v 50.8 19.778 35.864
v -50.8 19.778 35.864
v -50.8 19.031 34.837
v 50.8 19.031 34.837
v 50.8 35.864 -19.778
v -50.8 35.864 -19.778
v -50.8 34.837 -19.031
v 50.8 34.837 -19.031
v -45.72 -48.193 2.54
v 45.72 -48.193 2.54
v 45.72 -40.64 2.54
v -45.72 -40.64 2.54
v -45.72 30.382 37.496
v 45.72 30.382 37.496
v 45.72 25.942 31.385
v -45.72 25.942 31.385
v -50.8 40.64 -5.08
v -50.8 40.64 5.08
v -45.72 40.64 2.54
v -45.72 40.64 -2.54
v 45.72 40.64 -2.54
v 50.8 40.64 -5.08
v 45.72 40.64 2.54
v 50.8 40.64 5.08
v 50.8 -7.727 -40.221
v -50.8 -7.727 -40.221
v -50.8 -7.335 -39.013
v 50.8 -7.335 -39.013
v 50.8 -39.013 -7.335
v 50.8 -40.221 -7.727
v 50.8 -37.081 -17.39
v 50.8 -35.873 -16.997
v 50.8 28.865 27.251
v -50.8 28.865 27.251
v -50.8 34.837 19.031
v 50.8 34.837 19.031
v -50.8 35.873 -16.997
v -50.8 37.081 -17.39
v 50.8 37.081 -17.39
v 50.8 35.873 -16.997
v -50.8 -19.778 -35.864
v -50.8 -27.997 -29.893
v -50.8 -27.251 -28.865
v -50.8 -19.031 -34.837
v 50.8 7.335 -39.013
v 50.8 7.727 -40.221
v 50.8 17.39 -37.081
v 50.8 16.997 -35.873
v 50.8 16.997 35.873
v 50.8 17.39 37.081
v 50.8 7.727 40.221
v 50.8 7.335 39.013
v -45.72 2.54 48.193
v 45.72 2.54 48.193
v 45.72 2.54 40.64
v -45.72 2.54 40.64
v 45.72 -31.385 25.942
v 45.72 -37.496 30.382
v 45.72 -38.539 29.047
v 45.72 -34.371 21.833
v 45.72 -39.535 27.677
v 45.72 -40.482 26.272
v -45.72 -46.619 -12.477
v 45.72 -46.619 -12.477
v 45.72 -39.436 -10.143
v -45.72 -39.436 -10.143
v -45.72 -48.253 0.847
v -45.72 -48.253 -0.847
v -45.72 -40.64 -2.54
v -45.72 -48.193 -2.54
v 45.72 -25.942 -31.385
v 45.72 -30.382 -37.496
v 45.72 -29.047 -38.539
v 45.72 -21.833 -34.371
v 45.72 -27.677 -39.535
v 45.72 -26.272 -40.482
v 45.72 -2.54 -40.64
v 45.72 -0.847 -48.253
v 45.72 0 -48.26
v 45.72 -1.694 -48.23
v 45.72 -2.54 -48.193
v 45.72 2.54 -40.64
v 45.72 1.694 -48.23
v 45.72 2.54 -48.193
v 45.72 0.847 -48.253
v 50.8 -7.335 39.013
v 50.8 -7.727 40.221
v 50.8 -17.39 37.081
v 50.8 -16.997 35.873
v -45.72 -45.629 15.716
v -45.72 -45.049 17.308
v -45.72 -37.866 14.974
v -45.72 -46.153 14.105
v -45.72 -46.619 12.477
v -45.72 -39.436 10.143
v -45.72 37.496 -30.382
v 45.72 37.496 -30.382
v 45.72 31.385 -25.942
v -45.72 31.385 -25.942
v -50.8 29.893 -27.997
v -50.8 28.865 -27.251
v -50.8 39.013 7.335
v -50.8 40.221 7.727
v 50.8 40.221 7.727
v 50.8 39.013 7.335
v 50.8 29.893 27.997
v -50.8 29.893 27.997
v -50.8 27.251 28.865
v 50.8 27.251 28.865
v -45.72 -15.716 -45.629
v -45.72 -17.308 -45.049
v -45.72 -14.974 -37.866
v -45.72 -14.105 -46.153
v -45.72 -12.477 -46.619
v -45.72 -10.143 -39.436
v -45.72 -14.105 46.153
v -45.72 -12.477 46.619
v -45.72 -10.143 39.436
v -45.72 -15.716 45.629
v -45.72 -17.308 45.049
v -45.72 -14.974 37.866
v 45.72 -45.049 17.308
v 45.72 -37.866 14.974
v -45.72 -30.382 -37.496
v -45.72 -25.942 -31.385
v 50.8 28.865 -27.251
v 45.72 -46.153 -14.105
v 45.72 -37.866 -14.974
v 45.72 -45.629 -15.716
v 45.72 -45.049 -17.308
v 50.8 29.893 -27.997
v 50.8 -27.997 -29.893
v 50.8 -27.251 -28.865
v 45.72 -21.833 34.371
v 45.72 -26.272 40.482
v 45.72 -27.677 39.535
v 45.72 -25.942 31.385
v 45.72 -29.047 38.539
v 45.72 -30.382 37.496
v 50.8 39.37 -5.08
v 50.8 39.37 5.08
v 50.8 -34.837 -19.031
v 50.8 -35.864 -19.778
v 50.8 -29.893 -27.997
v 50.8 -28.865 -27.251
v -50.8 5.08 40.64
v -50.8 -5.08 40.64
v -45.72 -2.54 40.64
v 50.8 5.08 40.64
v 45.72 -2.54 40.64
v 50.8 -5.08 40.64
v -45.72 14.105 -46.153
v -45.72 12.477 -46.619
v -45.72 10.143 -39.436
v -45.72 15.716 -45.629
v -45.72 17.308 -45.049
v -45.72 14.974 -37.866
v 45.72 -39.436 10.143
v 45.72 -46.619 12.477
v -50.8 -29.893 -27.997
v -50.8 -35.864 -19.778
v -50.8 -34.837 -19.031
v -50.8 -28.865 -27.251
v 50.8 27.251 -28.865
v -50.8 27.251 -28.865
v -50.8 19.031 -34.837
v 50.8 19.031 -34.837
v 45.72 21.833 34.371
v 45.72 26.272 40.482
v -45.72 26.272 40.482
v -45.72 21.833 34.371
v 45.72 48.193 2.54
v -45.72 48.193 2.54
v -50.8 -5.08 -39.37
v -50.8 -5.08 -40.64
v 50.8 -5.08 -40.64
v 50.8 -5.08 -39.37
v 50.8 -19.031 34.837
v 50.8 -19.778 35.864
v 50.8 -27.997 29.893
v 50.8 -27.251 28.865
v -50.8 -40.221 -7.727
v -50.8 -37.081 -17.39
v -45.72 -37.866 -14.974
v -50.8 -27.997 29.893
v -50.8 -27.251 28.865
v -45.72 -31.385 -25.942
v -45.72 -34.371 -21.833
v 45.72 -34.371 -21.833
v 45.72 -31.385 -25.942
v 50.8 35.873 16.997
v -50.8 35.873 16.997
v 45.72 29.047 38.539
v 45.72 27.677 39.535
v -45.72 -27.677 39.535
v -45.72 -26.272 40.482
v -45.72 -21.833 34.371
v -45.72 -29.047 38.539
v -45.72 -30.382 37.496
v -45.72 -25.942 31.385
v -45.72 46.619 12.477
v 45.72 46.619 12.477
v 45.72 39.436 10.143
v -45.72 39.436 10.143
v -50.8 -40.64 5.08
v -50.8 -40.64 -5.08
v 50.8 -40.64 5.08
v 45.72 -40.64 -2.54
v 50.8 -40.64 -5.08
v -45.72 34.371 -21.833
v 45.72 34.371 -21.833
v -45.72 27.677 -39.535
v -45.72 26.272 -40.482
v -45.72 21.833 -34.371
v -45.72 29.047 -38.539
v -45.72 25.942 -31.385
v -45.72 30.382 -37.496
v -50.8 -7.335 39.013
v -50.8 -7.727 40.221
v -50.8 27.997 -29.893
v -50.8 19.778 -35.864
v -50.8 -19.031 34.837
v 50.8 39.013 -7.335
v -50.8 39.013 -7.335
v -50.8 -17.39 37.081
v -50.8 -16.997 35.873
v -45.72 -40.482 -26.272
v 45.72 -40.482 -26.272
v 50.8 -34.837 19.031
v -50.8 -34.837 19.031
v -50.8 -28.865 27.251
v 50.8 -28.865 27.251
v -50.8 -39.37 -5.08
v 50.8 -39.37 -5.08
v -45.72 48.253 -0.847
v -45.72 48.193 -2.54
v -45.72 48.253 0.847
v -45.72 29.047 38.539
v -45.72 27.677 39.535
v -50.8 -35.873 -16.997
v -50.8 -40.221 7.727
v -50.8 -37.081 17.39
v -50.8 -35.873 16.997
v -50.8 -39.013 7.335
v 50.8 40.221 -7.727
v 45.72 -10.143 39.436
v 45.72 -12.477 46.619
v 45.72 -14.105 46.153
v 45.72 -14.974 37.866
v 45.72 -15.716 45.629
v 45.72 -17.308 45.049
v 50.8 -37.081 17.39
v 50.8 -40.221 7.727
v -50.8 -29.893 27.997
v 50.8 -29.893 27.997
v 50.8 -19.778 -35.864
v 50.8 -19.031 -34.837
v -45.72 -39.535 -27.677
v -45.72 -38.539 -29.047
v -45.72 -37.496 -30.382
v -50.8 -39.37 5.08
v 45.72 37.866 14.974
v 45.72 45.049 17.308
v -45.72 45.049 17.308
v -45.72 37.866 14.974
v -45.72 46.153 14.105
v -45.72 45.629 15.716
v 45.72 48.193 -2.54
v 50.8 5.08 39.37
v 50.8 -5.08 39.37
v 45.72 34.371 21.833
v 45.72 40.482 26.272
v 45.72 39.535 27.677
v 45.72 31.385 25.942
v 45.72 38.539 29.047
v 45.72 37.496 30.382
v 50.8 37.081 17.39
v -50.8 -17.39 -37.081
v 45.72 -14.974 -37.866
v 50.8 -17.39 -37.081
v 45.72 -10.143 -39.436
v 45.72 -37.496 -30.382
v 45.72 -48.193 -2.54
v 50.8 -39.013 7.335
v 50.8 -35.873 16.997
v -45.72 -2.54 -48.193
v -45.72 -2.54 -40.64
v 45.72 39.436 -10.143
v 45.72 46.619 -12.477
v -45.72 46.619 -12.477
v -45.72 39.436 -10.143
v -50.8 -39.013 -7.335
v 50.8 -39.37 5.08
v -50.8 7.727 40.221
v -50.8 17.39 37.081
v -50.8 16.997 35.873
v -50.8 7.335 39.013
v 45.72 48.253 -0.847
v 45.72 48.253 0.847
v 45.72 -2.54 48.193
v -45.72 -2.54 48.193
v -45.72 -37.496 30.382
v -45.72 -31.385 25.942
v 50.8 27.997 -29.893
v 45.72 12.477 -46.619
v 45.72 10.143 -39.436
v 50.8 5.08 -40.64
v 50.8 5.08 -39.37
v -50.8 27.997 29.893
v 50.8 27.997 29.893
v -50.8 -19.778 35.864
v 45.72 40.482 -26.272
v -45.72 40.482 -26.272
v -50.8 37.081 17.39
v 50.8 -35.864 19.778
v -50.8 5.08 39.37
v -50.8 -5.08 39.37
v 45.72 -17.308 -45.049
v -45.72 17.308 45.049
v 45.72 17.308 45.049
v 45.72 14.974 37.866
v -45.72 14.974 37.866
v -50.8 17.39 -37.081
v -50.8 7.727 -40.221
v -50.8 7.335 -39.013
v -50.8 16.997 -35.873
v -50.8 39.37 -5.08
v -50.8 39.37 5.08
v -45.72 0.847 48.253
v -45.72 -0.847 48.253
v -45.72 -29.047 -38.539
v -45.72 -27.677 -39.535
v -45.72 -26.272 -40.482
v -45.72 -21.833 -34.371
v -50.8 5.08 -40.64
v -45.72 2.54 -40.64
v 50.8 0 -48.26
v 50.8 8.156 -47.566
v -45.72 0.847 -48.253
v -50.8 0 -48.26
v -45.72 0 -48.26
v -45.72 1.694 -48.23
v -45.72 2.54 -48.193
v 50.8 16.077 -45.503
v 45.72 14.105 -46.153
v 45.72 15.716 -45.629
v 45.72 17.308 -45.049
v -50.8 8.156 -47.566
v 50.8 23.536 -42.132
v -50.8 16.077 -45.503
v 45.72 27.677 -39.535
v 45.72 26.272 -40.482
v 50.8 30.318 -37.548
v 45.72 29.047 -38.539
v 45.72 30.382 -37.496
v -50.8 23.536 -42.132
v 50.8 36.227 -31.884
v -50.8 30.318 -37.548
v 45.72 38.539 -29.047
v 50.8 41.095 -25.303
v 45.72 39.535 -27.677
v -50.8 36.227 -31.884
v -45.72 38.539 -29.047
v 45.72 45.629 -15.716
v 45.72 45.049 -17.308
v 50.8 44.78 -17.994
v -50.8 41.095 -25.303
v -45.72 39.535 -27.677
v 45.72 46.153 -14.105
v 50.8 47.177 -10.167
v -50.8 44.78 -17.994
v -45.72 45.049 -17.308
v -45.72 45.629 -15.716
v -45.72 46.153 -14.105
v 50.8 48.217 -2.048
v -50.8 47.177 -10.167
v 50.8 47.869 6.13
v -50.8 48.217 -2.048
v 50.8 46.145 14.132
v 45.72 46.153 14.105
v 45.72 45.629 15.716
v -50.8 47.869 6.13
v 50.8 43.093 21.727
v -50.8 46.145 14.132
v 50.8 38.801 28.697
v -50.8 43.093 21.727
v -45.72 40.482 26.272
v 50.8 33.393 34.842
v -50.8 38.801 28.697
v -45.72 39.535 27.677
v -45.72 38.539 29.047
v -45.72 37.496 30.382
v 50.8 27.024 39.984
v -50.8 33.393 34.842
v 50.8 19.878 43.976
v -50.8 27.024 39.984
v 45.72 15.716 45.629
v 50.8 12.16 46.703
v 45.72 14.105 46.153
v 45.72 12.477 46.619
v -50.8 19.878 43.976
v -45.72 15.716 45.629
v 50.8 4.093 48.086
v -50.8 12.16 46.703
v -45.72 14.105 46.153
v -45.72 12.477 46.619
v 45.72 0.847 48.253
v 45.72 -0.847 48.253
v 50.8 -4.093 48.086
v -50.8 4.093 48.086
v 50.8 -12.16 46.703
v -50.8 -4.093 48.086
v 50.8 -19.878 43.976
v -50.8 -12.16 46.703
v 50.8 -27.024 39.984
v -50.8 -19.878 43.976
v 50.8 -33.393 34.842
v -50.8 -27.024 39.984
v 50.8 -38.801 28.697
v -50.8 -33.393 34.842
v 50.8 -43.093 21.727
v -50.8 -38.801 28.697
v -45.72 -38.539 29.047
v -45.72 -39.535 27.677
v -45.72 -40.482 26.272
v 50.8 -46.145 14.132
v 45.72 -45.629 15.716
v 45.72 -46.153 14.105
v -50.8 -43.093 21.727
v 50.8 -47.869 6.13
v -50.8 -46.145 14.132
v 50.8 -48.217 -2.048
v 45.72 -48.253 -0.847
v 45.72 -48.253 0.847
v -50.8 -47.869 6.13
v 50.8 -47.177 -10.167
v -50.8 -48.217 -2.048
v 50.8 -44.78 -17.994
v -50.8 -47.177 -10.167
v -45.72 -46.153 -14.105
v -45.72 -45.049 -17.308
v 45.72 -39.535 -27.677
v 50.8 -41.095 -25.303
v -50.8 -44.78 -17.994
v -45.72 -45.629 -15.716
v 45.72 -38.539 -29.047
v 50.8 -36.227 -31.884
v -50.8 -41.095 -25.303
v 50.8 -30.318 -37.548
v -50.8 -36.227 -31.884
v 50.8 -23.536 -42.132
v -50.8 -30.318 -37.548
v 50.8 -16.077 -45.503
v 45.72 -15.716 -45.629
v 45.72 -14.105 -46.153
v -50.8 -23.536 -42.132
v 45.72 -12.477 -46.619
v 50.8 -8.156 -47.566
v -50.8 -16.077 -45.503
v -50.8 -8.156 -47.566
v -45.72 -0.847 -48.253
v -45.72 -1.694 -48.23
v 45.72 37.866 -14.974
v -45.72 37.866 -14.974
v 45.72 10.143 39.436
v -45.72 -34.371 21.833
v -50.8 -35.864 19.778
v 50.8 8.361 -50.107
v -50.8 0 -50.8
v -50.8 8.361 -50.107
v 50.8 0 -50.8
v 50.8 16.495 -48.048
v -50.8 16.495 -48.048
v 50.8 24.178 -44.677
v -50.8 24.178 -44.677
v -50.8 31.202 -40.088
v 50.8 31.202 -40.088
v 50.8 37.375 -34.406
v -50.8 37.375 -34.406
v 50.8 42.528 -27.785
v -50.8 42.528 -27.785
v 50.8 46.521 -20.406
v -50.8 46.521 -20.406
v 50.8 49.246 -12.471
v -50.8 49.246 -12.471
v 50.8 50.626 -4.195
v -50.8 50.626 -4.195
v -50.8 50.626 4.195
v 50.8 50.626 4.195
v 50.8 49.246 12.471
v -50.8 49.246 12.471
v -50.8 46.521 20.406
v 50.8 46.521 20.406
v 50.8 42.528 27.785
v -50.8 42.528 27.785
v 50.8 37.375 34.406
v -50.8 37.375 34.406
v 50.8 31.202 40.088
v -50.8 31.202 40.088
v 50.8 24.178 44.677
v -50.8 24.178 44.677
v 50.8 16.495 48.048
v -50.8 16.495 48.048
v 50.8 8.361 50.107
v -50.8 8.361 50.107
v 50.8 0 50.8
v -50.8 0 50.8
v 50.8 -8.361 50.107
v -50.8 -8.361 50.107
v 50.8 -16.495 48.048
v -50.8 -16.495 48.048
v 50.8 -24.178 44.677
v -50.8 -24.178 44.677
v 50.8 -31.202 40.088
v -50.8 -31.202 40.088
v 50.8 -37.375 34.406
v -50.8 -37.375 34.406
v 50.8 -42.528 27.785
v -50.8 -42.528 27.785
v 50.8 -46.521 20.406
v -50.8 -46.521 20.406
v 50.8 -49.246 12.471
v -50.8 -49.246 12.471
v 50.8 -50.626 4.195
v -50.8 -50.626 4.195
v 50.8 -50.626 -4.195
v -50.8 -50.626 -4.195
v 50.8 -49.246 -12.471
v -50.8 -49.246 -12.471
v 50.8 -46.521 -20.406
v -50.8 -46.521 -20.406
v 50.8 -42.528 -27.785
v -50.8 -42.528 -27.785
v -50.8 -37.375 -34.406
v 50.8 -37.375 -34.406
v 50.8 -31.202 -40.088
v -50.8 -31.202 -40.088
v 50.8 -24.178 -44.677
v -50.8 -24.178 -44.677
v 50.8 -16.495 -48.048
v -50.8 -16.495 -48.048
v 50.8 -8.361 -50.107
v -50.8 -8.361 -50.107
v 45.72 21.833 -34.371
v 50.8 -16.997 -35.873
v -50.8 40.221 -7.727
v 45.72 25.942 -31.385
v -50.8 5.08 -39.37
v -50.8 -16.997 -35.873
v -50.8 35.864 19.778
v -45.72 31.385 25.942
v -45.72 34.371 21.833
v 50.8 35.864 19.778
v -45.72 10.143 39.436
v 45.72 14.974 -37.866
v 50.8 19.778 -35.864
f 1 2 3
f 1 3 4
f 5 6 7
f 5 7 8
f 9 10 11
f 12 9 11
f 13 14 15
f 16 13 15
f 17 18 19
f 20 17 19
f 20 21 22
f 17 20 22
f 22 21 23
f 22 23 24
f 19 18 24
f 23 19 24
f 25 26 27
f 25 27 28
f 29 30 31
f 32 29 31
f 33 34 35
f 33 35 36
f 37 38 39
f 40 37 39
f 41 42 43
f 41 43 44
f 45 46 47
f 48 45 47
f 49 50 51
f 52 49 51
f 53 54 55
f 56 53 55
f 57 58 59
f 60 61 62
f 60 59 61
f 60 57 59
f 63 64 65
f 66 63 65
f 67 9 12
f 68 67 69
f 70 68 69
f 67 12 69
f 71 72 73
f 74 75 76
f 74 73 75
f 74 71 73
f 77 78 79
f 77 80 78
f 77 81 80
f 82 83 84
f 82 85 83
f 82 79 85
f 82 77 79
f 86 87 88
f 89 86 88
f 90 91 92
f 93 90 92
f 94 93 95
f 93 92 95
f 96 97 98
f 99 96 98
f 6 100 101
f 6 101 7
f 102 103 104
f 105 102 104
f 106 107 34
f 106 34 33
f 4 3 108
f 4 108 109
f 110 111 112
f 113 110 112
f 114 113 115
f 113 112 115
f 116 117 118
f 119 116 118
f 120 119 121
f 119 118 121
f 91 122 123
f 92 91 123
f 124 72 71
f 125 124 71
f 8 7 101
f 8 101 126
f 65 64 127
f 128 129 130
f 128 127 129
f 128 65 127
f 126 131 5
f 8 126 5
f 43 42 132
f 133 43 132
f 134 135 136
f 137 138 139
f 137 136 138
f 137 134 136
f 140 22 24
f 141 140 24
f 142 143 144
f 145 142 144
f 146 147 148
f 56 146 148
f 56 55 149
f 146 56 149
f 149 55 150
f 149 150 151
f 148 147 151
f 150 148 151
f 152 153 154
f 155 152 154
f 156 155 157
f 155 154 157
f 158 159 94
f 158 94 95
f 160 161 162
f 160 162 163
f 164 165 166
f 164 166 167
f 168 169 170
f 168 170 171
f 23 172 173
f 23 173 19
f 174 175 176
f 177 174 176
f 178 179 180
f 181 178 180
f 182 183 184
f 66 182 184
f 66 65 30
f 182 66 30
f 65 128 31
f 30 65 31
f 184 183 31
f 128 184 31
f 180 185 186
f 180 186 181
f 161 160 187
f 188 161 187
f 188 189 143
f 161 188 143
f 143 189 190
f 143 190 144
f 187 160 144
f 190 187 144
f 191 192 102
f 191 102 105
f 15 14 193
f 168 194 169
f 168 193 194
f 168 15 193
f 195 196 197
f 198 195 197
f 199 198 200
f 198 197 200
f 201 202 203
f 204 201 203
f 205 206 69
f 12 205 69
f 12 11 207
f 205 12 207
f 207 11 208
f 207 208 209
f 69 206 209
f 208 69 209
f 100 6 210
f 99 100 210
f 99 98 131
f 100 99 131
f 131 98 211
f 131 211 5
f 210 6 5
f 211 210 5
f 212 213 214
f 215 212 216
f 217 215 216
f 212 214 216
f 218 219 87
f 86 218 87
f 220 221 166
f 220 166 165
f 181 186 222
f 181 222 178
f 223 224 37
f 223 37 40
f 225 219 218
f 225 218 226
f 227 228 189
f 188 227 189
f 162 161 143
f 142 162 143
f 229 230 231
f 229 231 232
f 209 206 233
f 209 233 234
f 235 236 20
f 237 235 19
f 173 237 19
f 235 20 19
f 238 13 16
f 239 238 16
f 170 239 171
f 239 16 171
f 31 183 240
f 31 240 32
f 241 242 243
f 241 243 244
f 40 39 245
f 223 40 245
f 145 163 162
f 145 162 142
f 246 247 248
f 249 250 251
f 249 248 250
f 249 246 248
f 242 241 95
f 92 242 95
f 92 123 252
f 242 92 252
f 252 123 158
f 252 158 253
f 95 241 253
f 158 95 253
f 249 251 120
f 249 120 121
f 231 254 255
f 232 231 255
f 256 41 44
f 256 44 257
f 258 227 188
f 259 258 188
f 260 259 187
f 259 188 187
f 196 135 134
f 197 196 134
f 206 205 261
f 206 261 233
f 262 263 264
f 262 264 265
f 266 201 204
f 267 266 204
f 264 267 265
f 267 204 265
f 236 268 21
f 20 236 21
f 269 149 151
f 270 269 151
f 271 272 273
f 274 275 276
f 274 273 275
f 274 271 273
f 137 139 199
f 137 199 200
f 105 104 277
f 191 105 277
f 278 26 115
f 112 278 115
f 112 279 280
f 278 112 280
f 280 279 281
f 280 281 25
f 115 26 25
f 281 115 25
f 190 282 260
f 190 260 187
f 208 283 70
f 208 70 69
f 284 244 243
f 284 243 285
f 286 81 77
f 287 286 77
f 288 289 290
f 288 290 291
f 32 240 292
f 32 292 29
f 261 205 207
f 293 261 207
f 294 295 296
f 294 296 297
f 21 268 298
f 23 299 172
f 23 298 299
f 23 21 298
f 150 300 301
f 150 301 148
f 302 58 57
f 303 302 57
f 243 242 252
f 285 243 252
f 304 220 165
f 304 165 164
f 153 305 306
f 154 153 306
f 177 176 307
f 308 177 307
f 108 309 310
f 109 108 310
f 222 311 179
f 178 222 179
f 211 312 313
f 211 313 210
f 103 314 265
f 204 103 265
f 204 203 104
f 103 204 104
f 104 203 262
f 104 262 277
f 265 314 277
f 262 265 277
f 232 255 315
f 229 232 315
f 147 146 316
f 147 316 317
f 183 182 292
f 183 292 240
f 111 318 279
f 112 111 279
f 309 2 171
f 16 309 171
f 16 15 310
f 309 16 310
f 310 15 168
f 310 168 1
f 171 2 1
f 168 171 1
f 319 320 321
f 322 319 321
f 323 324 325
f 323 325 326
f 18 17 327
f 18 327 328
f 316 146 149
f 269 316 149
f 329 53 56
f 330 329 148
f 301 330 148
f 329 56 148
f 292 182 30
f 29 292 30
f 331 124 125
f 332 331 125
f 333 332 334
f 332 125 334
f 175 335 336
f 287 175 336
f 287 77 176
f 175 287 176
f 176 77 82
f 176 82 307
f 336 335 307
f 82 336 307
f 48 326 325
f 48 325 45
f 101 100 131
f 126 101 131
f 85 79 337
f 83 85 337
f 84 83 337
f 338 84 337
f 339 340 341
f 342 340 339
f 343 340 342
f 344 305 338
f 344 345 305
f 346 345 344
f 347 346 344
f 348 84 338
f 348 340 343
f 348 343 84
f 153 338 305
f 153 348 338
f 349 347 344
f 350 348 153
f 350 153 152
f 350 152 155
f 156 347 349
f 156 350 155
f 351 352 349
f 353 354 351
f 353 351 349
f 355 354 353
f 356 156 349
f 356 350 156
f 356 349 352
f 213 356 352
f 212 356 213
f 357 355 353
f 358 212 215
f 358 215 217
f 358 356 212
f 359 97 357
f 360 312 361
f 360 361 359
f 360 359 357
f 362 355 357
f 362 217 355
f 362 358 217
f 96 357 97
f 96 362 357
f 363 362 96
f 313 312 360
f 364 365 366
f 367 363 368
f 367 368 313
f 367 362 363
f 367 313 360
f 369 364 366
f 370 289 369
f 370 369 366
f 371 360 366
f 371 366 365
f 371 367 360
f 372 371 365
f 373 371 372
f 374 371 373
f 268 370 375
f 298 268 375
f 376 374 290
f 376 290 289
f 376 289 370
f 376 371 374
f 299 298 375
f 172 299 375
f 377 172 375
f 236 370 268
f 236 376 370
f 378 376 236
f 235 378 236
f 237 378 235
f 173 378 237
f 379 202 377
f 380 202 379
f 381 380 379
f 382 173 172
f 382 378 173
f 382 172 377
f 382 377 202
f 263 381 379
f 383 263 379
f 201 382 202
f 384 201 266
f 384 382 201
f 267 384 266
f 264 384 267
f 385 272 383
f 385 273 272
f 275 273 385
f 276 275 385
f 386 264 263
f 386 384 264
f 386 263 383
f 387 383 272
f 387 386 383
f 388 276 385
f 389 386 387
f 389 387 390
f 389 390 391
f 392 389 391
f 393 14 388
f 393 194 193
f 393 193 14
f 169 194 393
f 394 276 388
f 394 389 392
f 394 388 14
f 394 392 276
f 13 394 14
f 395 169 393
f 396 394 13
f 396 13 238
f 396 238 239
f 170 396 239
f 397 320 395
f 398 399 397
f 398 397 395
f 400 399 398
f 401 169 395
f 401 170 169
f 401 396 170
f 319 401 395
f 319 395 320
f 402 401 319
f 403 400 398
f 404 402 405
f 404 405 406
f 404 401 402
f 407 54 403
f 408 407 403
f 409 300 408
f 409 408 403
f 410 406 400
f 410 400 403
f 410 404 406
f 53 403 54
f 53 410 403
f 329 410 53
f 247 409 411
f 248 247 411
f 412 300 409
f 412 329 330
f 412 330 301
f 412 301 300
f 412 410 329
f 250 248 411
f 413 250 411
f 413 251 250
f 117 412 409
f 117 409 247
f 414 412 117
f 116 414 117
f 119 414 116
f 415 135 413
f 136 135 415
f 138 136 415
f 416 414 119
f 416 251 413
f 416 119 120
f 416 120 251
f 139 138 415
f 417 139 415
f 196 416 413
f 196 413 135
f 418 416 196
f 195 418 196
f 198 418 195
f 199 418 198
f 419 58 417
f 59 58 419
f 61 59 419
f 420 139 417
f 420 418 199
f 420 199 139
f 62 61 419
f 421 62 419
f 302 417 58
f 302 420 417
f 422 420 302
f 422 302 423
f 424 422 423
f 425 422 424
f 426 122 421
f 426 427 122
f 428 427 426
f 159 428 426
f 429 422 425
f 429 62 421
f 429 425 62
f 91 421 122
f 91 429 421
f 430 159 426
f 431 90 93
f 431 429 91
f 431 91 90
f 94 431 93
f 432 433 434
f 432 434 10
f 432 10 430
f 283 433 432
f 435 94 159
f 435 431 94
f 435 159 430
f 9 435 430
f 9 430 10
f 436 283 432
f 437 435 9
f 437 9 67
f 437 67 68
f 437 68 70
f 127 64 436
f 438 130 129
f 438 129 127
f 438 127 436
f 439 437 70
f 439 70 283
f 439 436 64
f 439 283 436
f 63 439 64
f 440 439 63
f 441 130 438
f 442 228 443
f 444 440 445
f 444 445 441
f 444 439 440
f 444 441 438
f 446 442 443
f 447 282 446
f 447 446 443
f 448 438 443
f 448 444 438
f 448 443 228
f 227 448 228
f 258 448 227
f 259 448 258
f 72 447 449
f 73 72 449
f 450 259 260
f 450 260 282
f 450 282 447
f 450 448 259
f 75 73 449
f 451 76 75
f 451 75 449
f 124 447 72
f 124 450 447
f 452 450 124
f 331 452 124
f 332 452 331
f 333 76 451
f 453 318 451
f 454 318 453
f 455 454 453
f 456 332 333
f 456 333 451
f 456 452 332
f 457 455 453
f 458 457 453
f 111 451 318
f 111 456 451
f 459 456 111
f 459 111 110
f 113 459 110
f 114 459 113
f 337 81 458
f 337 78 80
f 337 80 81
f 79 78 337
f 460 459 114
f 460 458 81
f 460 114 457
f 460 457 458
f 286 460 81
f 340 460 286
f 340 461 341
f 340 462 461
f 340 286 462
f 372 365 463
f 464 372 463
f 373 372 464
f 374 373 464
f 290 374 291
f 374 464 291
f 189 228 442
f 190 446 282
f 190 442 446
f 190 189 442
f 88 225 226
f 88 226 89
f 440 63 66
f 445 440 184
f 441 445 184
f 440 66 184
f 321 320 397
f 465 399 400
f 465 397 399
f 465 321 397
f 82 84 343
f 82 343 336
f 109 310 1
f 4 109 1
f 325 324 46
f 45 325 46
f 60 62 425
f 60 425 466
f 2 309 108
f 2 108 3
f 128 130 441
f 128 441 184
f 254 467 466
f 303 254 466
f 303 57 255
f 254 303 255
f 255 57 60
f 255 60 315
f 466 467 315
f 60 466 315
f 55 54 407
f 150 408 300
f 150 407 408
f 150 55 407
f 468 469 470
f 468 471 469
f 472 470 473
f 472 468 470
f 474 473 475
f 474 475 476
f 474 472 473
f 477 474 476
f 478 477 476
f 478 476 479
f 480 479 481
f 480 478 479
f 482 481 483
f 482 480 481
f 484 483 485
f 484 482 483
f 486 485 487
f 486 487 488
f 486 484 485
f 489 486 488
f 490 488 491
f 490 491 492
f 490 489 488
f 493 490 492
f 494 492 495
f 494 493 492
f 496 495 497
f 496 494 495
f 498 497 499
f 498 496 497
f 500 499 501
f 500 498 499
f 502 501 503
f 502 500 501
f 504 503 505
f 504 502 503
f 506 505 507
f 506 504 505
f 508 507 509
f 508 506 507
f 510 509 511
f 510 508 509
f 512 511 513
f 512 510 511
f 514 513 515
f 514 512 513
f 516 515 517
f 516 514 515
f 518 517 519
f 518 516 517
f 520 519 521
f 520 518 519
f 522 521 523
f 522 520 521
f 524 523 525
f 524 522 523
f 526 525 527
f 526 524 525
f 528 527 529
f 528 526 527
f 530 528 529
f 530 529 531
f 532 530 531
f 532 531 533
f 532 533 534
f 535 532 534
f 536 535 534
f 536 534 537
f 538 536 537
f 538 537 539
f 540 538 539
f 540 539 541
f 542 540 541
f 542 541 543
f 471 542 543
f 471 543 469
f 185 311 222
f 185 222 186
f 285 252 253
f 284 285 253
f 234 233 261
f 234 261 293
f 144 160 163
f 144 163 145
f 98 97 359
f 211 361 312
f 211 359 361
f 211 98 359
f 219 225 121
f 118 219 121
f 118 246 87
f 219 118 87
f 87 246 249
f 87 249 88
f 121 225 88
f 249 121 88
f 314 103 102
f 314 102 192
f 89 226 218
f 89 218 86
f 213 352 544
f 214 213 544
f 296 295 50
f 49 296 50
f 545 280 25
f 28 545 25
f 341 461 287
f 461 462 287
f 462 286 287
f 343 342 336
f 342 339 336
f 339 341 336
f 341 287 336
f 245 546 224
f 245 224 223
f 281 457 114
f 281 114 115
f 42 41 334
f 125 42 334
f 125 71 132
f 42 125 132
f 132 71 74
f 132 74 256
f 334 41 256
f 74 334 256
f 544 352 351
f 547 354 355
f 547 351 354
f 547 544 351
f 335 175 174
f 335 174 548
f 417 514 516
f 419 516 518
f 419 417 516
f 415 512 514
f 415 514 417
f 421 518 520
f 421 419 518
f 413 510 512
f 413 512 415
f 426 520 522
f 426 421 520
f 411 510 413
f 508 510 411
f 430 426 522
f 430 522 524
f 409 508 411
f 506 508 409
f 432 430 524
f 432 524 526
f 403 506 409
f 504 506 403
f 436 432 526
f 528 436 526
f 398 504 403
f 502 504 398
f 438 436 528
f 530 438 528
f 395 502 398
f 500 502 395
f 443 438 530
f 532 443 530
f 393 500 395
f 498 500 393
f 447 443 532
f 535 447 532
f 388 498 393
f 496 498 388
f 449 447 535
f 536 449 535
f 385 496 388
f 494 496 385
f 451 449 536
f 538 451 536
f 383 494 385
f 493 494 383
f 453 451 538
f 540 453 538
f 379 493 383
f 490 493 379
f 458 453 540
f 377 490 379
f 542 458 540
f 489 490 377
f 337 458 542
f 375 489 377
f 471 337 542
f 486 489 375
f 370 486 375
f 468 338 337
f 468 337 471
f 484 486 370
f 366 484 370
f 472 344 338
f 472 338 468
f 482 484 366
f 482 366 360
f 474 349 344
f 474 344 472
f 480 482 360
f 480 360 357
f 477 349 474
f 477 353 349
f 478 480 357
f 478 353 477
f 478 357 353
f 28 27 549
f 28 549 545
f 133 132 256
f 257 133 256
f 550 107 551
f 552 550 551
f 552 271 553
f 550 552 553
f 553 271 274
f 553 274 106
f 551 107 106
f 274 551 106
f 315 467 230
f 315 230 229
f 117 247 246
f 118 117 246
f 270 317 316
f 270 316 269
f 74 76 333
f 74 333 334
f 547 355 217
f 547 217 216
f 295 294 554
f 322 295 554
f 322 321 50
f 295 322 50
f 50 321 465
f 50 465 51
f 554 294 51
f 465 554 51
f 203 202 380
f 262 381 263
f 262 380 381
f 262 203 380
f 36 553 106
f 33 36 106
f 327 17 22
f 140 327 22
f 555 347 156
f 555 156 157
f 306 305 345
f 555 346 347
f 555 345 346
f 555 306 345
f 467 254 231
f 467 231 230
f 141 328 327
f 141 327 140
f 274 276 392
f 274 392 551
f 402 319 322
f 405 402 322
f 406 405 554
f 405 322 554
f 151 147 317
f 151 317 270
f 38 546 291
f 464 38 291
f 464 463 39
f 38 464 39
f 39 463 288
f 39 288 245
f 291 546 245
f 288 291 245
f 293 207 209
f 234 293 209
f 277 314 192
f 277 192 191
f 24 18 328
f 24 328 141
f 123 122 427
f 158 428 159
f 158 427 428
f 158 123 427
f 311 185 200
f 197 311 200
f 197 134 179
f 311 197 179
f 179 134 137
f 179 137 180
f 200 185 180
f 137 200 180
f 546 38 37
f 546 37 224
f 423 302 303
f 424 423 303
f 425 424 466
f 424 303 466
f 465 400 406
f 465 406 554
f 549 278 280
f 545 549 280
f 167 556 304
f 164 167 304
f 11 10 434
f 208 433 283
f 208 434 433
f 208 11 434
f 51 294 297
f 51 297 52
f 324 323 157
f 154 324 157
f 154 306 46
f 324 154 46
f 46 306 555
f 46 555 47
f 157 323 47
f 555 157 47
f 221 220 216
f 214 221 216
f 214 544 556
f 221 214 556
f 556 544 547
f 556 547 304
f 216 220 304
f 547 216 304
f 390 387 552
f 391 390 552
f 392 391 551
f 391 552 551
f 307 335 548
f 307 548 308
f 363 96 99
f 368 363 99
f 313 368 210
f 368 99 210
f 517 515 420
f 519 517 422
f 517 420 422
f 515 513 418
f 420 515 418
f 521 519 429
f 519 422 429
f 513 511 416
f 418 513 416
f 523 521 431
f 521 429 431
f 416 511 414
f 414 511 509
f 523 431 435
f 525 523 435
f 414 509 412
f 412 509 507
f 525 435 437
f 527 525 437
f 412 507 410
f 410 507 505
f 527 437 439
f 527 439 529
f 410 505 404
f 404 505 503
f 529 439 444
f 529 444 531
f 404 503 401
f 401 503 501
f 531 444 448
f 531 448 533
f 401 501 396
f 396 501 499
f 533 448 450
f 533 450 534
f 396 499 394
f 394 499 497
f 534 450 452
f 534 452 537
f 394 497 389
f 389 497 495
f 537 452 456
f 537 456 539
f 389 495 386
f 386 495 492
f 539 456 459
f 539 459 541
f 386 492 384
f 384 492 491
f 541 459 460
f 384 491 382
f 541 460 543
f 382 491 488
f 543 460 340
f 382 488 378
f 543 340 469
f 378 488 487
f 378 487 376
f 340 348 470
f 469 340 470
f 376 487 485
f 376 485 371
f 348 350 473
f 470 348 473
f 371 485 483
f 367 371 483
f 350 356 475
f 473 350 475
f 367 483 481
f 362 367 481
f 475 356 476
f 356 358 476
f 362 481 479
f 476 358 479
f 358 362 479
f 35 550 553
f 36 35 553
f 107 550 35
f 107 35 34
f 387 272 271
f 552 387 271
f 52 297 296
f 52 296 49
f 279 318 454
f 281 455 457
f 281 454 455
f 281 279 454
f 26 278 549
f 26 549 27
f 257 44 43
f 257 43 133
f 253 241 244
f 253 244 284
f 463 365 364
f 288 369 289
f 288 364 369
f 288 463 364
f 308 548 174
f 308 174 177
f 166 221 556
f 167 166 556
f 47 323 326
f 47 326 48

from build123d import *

# Parameters (mm, degrees)
SKETCH2_R           = 50.8
SKETCH2_R_2         = 48.26
BOSS_EXTRUDE1_DEPTH = 50.8
SKETCH3_W           = 5.08
SKETCH3_H           = 7.62
BOSS_EXTRUDE2_DEPTH = 45.72
SKETCH4_W           = 101.6
SKETCH4_H           = 10.16
BOSS_EXTRUDE3_DEPTH = 1.27
CIRPATTERN1_COUNT   = 20


with BuildPart() as part:
    # Sketch2 → Boss-Extrude1 (new body, symmetric)
    with BuildSketch(Plane(origin=(0, 0, 0), x_dir=(0, 0, -1), z_dir=(1, 0, 0))):
        Circle(SKETCH2_R)
        Circle(SKETCH2_R_2, mode=Mode.SUBTRACT)
    extrude(amount=BOSS_EXTRUDE1_DEPTH, both=True)

    # Sketch3 → Boss-Extrude2 (add, symmetric)
    with BuildSketch(Plane(origin=(0, 0, 0), x_dir=(0, 0, -1), z_dir=(1, 0, 0))):
        with Locations((0, -44.45)):
            Rectangle(SKETCH3_W, SKETCH3_H)
    boss_extrude2 = extrude(amount=BOSS_EXTRUDE2_DEPTH, both=True)

    # Sketch4 → Boss-Extrude3 (add)
    with BuildSketch(Plane(origin=(0, -40.64, 0), x_dir=(1, 0, 0), z_dir=(0, 1, 0))):
        Rectangle(SKETCH4_W, SKETCH4_H)
    boss_extrude3 = extrude(amount=BOSS_EXTRUDE3_DEPTH)

    # CirPattern1: Boss-Extrude2, Boss-Extrude3 ×20 about axis
    cirpattern1_axis = Axis((0, 0, 0), (1, 0, 0))
    for i in range(1, CIRPATTERN1_COUNT):
        add(boss_extrude2.rotate(cirpattern1_axis, i * 360 / CIRPATTERN1_COUNT))
        add(boss_extrude3.rotate(cirpattern1_axis, i * 360 / CIRPATTERN1_COUNT))


solid = part.part
